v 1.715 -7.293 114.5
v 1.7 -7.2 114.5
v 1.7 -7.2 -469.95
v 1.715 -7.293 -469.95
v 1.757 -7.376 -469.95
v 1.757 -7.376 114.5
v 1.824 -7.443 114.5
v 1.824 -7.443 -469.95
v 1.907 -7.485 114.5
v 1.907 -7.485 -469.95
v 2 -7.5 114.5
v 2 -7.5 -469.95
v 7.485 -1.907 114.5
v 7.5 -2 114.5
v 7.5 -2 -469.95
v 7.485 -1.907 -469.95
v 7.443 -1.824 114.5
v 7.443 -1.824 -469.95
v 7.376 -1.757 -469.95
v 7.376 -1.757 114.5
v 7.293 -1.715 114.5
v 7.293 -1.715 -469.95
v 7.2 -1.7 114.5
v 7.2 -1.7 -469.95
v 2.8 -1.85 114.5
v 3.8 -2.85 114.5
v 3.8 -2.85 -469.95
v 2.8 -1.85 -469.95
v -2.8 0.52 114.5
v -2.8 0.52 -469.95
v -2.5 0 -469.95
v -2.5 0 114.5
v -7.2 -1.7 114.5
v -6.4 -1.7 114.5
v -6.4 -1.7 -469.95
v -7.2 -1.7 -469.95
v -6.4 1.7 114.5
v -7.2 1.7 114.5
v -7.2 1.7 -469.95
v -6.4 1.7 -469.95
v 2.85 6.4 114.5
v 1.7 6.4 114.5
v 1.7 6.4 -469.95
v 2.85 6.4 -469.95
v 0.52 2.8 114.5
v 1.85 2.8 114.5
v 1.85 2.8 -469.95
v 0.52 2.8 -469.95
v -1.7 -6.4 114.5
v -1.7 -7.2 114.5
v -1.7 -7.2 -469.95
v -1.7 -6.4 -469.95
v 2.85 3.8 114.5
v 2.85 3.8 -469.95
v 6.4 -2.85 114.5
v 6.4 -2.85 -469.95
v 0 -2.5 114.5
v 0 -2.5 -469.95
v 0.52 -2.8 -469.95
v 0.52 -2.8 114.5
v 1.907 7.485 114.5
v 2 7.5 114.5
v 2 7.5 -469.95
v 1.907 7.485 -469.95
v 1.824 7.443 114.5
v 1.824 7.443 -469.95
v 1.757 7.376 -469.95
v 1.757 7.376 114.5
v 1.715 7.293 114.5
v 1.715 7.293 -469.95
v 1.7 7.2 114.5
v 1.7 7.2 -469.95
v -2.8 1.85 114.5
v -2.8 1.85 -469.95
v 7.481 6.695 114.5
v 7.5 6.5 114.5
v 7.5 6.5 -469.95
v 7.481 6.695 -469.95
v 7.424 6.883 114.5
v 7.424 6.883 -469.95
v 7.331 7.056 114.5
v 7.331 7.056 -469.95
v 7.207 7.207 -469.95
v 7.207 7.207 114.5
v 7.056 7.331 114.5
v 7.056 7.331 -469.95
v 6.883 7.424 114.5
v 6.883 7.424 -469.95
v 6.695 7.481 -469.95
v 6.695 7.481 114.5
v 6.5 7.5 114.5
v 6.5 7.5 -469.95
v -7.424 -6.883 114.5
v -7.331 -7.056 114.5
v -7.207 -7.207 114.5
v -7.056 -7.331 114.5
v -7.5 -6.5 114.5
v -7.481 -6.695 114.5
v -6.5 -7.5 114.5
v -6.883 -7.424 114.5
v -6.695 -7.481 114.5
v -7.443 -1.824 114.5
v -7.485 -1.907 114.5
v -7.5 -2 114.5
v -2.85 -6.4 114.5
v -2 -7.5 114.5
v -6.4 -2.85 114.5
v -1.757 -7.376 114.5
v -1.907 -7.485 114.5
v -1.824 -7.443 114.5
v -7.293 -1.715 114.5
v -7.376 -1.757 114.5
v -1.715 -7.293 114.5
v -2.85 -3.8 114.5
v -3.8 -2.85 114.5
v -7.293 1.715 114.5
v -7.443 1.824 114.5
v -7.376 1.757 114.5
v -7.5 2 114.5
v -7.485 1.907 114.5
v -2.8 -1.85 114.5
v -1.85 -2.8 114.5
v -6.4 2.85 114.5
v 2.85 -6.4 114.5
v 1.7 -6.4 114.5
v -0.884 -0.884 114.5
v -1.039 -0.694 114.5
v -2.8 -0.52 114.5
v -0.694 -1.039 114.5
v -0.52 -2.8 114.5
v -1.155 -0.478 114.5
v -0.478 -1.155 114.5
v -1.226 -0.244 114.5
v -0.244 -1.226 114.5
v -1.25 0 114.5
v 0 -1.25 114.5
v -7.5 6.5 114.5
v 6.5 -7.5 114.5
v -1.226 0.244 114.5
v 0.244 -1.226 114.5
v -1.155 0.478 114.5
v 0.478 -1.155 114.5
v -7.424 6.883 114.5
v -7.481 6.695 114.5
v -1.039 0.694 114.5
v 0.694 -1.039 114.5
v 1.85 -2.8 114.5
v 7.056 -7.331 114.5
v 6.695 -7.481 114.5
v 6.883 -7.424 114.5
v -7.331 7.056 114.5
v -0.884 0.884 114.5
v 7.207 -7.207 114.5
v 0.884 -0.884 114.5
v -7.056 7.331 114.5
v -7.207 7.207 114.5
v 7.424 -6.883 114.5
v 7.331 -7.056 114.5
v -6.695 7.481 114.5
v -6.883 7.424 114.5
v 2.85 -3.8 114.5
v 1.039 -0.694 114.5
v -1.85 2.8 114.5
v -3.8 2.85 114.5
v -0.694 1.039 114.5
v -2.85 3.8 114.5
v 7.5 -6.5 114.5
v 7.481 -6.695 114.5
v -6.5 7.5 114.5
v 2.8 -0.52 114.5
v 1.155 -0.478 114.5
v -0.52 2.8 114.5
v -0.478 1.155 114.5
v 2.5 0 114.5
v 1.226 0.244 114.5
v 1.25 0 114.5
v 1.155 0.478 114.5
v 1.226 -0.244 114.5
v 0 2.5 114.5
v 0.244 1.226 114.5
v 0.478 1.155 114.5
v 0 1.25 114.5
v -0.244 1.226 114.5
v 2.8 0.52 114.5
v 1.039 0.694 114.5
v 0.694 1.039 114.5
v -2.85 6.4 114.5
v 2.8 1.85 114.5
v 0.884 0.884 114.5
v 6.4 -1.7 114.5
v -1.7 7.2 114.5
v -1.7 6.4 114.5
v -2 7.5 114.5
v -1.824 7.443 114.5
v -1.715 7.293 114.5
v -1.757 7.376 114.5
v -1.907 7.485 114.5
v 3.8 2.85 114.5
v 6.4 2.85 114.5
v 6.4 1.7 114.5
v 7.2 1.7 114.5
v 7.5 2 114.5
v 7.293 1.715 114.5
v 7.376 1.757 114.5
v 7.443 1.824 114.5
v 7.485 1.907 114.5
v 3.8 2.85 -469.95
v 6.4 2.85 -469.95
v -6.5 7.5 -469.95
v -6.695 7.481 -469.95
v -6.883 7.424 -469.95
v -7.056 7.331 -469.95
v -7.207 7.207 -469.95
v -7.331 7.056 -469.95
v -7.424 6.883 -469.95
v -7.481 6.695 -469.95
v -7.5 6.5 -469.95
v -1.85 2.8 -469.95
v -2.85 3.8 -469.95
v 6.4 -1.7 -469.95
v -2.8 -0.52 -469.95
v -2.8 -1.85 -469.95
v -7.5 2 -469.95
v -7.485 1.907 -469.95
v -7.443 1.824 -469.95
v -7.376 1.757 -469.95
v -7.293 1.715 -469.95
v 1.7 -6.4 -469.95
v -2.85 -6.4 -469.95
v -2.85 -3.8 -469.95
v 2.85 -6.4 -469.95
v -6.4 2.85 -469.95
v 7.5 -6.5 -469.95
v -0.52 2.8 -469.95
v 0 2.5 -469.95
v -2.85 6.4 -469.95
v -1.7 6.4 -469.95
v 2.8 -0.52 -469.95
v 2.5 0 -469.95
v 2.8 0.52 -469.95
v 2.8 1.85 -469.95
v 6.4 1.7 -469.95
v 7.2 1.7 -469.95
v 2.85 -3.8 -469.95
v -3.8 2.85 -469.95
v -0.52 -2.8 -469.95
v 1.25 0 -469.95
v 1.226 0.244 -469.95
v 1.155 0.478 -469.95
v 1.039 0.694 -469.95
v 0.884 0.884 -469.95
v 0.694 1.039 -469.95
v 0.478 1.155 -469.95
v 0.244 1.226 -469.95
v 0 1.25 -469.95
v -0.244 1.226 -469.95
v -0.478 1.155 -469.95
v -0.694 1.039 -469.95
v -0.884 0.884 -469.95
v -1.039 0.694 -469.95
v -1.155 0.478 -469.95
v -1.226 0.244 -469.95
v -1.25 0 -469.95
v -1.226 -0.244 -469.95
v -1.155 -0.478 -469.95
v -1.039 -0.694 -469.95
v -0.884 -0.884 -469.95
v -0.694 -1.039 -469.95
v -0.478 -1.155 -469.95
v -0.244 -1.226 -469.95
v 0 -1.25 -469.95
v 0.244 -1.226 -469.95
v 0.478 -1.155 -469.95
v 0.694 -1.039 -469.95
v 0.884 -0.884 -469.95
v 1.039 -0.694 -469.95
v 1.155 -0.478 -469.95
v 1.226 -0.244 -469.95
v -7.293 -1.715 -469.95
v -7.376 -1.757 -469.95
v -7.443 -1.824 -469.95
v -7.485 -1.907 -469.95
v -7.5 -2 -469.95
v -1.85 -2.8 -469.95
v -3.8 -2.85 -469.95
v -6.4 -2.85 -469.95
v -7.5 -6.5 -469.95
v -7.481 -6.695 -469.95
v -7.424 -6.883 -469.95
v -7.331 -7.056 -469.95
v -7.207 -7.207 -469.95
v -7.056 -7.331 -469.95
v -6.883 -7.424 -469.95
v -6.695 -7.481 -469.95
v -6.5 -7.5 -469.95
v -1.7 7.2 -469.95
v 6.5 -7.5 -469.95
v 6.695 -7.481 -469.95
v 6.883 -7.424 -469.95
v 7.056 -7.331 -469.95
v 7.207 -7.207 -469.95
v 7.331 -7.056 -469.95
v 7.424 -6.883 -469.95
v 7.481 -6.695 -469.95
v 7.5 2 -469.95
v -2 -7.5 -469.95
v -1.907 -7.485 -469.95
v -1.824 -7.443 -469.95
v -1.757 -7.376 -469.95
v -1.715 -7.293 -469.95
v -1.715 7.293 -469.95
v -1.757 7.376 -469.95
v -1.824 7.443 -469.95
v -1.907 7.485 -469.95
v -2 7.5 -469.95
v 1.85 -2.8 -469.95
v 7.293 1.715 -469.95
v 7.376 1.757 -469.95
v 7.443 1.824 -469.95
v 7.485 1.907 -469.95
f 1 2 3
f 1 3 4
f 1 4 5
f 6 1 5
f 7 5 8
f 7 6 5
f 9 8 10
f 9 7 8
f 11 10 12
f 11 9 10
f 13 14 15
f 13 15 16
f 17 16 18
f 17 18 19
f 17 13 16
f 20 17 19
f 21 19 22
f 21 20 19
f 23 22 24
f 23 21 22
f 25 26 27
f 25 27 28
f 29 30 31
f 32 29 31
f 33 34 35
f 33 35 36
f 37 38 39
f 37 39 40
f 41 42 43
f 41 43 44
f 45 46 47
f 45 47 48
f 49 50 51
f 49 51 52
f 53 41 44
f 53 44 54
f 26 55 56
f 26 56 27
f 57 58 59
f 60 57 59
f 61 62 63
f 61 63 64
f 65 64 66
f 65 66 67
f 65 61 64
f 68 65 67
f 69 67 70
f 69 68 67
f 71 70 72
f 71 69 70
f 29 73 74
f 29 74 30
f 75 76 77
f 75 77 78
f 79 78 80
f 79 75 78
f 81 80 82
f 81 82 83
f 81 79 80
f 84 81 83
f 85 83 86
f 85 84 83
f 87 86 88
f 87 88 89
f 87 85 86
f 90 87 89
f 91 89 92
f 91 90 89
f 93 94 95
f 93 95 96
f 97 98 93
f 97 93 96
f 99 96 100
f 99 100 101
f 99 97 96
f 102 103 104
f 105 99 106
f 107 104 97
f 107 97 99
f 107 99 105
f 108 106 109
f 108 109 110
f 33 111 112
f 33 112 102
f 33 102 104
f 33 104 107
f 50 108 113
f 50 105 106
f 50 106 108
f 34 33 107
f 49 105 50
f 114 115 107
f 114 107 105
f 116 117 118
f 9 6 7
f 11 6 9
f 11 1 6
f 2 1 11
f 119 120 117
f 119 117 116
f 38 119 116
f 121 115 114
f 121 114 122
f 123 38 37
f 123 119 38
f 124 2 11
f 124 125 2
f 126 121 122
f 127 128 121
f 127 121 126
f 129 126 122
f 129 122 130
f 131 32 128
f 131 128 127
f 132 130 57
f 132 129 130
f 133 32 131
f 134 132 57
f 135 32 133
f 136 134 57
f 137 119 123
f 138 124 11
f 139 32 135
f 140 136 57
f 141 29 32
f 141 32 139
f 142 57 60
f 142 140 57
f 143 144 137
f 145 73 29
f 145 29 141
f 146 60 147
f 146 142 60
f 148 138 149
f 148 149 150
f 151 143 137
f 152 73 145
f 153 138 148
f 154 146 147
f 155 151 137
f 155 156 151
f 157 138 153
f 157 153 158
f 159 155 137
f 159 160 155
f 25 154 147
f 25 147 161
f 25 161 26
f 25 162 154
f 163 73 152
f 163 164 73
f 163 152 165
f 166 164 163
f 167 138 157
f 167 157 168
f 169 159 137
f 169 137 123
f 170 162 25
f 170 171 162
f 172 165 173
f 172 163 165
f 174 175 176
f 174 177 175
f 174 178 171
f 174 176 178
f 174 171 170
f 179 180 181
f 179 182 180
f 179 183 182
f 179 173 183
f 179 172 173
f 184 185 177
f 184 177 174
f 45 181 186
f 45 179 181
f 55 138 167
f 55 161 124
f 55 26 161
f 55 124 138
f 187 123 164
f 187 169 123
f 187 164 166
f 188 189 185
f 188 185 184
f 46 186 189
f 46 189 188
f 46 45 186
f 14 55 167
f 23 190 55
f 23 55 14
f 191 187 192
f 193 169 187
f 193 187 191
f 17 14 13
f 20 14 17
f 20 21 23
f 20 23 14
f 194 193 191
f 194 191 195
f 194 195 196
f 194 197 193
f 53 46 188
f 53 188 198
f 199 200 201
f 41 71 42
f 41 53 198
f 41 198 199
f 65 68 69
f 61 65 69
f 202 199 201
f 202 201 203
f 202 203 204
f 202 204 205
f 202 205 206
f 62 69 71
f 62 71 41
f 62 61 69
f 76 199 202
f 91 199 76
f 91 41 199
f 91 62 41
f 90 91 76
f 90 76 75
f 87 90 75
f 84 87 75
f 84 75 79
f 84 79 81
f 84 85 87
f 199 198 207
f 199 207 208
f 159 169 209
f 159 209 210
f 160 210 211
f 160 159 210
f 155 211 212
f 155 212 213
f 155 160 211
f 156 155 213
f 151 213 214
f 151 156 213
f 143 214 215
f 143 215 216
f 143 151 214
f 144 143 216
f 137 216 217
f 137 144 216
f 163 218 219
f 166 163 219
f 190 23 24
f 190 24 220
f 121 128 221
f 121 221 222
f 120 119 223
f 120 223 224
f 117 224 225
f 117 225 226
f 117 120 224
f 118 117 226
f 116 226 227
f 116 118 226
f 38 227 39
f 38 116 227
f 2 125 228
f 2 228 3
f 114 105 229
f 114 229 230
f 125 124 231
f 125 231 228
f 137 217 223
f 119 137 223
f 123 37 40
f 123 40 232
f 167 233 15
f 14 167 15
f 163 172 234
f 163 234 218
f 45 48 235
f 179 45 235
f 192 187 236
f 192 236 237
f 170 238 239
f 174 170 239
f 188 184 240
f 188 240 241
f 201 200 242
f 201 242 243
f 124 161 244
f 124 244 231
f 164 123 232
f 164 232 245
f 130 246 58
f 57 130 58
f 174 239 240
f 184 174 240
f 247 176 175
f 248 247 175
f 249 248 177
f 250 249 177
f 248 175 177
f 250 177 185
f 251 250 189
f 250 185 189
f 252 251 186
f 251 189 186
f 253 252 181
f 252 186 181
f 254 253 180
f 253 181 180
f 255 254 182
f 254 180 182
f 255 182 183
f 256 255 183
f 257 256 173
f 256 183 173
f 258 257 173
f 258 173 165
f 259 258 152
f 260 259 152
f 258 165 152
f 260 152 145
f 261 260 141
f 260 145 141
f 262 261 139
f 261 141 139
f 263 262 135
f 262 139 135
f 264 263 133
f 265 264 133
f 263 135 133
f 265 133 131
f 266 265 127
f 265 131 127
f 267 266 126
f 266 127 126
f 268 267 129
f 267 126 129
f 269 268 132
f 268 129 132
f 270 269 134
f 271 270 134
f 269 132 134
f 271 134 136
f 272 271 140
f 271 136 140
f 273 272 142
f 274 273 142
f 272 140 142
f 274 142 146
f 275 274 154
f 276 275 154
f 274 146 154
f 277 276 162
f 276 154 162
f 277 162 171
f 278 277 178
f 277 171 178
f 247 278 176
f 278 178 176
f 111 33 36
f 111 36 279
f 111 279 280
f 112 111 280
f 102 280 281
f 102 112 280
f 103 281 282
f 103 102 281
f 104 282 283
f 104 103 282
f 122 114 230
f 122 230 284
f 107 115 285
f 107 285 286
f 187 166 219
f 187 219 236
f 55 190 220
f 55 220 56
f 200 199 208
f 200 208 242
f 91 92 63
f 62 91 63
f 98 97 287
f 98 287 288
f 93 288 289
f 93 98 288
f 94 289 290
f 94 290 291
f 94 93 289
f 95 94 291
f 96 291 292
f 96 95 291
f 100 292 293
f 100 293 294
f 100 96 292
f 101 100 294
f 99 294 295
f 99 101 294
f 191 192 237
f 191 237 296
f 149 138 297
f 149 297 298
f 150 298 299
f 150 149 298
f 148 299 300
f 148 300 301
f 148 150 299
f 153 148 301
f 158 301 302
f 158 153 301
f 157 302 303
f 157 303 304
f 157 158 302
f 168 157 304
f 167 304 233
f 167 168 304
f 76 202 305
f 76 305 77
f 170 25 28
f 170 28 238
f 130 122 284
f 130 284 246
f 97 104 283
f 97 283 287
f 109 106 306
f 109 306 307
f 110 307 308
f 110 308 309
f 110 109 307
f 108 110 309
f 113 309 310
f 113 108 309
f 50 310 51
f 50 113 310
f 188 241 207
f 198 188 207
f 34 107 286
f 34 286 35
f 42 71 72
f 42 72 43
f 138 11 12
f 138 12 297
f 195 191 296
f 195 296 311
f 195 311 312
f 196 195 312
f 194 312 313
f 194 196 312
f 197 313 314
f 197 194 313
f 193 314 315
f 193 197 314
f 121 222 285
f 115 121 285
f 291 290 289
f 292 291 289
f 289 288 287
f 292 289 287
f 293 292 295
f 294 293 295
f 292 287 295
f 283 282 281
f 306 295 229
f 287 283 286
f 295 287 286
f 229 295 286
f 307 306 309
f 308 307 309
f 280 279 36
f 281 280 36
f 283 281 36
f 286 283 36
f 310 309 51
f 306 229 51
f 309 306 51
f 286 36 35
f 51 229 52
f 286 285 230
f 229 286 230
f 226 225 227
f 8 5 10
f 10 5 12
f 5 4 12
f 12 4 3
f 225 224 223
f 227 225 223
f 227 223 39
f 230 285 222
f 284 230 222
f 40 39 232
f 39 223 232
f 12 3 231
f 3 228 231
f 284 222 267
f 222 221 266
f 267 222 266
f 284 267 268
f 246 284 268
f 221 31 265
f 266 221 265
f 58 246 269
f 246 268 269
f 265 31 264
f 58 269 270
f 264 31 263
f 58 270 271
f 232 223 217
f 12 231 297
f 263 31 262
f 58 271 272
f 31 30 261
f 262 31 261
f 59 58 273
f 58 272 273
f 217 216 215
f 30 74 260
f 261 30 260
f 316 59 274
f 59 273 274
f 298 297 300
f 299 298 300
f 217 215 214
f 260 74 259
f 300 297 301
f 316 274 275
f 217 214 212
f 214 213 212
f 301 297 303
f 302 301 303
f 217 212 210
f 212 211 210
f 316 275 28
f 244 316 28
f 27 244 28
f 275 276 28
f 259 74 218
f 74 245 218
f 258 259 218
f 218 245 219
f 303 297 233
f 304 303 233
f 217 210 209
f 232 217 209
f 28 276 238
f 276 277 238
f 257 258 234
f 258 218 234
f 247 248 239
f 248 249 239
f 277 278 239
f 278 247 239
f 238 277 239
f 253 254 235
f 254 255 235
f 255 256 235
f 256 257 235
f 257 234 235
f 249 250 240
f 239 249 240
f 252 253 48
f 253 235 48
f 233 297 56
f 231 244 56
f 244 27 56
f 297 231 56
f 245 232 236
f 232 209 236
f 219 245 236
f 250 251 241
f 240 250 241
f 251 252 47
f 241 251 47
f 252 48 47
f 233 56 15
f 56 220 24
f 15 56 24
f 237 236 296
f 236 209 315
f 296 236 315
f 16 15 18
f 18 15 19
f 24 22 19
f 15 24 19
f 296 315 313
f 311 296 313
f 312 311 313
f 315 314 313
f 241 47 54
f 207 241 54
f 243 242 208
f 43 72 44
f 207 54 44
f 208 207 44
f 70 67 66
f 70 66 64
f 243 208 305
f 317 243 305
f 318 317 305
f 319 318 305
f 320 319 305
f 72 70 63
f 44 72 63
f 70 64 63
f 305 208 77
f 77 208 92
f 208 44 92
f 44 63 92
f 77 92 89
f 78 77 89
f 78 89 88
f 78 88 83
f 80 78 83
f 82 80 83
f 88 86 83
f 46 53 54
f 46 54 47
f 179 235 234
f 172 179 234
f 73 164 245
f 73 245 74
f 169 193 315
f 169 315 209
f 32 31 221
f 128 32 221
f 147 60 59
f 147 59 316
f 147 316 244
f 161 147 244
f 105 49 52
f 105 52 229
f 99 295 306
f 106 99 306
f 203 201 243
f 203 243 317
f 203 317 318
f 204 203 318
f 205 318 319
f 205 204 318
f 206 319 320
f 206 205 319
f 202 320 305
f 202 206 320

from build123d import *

# Parameters (mm, degrees)
SKETCH1_R           = 1.25
BOSS_EXTRUDE1_DEPTH = 584.45


with BuildPart() as part:
    # Sketch1 → Boss-Extrude1 (new body)
    with BuildSketch(Plane.XY.offset(114.5)):
        with BuildLine():
            Line((-7.5, 6.5), (-7.5, 2))
            ThreePointArc((-7.5, 2), (-7.412132034, 1.787867966), (-7.2, 1.7))
            Line((-7.2, 1.7), (-6.4, 1.7))
            Line((-6.4, 1.7), (-6.4, 2.85))
            Line((-6.4, 2.85), (-3.8, 2.85))
            Line((-3.8, 2.85), (-2.8, 1.85))
            Line((-2.8, 1.85), (-2.8, 0.519615242))
            Line((-2.8, 0.519615242), (-2.5, 0))
            Line((-2.5, 0), (-2.8, -0.519615242))
            Line((-2.8, -0.519615242), (-2.8, -1.85))
            Line((-2.8, -1.85), (-3.8, -2.85))
            Line((-3.8, -2.85), (-6.4, -2.85))
            Line((-6.4, -2.85), (-6.4, -1.7))
            Line((-6.4, -1.7), (-7.2, -1.7))
            ThreePointArc((-7.2, -1.7), (-7.412132034, -1.787867966), (-7.5, -2))
            Line((-7.5, -2), (-7.5, -6.5))
            ThreePointArc((-7.5, -6.5), (-7.207106781, -7.207106781), (-6.5, -7.5))
            Line((-6.5, -7.5), (-2, -7.5))
            ThreePointArc((-2, -7.5), (-1.787867966, -7.412132034), (-1.7, -7.2))
            Line((-1.7, -7.2), (-1.7, -6.4))
            Line((-1.7, -6.4), (-2.85, -6.4))
            Line((-2.85, -6.4), (-2.85, -3.8))
            Line((-2.85, -3.8), (-1.85, -2.8))
            Line((-1.85, -2.8), (-0.519615242, -2.8))
            Line((-0.519615242, -2.8), (0, -2.5))
            Line((0, -2.5), (0.519615242, -2.8))
            Line((0.519615242, -2.8), (1.85, -2.8))
            Line((1.85, -2.8), (2.85, -3.8))
            Line((2.85, -3.8), (2.85, -6.4))
            Line((2.85, -6.4), (1.7, -6.4))
            Line((1.7, -6.4), (1.7, -7.2))
            ThreePointArc((1.7, -7.2), (1.787867966, -7.412132034), (2, -7.5))
            Line((2, -7.5), (6.5, -7.5))
            ThreePointArc((6.5, -7.5), (7.207106781, -7.207106781), (7.5, -6.5))
            Line((7.5, -6.5), (7.5, -2))
            ThreePointArc((7.5, -2), (7.412132034, -1.787867966), (7.2, -1.7))
            Line((7.2, -1.7), (6.4, -1.7))
            Line((6.4, -1.7), (6.4, -2.85))
            Line((6.4, -2.85), (3.8, -2.85))
            Line((3.8, -2.85), (2.8, -1.85))
            Line((2.8, -1.85), (2.8, -0.519615242))
            Line((2.8, -0.519615242), (2.5, 0))
            Line((2.5, 0), (2.8, 0.519615242))
            Line((2.8, 0.519615242), (2.8, 1.85))
            Line((2.8, 1.85), (3.8, 2.85))
            Line((3.8, 2.85), (6.4, 2.85))
            Line((6.4, 2.85), (6.4, 1.7))
            Line((6.4, 1.7), (7.2, 1.7))
            ThreePointArc((7.2, 1.7), (7.412132034, 1.787867966), (7.5, 2))
            Line((7.5, 2), (7.5, 6.5))
            ThreePointArc((7.5, 6.5), (7.207106781, 7.207106781), (6.5, 7.5))
            Line((6.5, 7.5), (2, 7.5))
            ThreePointArc((2, 7.5), (1.787867966, 7.412132034), (1.7, 7.2))
            Line((1.7, 7.2), (1.7, 6.4))
            Line((1.7, 6.4), (2.85, 6.4))
            Line((2.85, 6.4), (2.85, 3.8))
            Line((2.85, 3.8), (1.85, 2.8))
            Line((1.85, 2.8), (0.519615242, 2.8))
            Line((0.519615242, 2.8), (0, 2.5))
            Line((0, 2.5), (-0.519615242, 2.8))
            Line((-0.519615242, 2.8), (-1.85, 2.8))
            Line((-1.85, 2.8), (-2.85, 3.8))
            Line((-2.85, 3.8), (-2.85, 6.4))
            Line((-2.85, 6.4), (-1.7, 6.4))
            Line((-1.7, 6.4), (-1.7, 7.2))
            ThreePointArc((-1.7, 7.2), (-1.787867966, 7.412132034), (-2, 7.5))
            Line((-2, 7.5), (-6.5, 7.5))
            ThreePointArc((-6.5, 7.5), (-7.207106781, 7.207106781), (-7.5, 6.5))
        make_face()
        Circle(SKETCH1_R, mode=Mode.SUBTRACT)
    extrude(amount=-BOSS_EXTRUDE1_DEPTH)


solid = part.part
